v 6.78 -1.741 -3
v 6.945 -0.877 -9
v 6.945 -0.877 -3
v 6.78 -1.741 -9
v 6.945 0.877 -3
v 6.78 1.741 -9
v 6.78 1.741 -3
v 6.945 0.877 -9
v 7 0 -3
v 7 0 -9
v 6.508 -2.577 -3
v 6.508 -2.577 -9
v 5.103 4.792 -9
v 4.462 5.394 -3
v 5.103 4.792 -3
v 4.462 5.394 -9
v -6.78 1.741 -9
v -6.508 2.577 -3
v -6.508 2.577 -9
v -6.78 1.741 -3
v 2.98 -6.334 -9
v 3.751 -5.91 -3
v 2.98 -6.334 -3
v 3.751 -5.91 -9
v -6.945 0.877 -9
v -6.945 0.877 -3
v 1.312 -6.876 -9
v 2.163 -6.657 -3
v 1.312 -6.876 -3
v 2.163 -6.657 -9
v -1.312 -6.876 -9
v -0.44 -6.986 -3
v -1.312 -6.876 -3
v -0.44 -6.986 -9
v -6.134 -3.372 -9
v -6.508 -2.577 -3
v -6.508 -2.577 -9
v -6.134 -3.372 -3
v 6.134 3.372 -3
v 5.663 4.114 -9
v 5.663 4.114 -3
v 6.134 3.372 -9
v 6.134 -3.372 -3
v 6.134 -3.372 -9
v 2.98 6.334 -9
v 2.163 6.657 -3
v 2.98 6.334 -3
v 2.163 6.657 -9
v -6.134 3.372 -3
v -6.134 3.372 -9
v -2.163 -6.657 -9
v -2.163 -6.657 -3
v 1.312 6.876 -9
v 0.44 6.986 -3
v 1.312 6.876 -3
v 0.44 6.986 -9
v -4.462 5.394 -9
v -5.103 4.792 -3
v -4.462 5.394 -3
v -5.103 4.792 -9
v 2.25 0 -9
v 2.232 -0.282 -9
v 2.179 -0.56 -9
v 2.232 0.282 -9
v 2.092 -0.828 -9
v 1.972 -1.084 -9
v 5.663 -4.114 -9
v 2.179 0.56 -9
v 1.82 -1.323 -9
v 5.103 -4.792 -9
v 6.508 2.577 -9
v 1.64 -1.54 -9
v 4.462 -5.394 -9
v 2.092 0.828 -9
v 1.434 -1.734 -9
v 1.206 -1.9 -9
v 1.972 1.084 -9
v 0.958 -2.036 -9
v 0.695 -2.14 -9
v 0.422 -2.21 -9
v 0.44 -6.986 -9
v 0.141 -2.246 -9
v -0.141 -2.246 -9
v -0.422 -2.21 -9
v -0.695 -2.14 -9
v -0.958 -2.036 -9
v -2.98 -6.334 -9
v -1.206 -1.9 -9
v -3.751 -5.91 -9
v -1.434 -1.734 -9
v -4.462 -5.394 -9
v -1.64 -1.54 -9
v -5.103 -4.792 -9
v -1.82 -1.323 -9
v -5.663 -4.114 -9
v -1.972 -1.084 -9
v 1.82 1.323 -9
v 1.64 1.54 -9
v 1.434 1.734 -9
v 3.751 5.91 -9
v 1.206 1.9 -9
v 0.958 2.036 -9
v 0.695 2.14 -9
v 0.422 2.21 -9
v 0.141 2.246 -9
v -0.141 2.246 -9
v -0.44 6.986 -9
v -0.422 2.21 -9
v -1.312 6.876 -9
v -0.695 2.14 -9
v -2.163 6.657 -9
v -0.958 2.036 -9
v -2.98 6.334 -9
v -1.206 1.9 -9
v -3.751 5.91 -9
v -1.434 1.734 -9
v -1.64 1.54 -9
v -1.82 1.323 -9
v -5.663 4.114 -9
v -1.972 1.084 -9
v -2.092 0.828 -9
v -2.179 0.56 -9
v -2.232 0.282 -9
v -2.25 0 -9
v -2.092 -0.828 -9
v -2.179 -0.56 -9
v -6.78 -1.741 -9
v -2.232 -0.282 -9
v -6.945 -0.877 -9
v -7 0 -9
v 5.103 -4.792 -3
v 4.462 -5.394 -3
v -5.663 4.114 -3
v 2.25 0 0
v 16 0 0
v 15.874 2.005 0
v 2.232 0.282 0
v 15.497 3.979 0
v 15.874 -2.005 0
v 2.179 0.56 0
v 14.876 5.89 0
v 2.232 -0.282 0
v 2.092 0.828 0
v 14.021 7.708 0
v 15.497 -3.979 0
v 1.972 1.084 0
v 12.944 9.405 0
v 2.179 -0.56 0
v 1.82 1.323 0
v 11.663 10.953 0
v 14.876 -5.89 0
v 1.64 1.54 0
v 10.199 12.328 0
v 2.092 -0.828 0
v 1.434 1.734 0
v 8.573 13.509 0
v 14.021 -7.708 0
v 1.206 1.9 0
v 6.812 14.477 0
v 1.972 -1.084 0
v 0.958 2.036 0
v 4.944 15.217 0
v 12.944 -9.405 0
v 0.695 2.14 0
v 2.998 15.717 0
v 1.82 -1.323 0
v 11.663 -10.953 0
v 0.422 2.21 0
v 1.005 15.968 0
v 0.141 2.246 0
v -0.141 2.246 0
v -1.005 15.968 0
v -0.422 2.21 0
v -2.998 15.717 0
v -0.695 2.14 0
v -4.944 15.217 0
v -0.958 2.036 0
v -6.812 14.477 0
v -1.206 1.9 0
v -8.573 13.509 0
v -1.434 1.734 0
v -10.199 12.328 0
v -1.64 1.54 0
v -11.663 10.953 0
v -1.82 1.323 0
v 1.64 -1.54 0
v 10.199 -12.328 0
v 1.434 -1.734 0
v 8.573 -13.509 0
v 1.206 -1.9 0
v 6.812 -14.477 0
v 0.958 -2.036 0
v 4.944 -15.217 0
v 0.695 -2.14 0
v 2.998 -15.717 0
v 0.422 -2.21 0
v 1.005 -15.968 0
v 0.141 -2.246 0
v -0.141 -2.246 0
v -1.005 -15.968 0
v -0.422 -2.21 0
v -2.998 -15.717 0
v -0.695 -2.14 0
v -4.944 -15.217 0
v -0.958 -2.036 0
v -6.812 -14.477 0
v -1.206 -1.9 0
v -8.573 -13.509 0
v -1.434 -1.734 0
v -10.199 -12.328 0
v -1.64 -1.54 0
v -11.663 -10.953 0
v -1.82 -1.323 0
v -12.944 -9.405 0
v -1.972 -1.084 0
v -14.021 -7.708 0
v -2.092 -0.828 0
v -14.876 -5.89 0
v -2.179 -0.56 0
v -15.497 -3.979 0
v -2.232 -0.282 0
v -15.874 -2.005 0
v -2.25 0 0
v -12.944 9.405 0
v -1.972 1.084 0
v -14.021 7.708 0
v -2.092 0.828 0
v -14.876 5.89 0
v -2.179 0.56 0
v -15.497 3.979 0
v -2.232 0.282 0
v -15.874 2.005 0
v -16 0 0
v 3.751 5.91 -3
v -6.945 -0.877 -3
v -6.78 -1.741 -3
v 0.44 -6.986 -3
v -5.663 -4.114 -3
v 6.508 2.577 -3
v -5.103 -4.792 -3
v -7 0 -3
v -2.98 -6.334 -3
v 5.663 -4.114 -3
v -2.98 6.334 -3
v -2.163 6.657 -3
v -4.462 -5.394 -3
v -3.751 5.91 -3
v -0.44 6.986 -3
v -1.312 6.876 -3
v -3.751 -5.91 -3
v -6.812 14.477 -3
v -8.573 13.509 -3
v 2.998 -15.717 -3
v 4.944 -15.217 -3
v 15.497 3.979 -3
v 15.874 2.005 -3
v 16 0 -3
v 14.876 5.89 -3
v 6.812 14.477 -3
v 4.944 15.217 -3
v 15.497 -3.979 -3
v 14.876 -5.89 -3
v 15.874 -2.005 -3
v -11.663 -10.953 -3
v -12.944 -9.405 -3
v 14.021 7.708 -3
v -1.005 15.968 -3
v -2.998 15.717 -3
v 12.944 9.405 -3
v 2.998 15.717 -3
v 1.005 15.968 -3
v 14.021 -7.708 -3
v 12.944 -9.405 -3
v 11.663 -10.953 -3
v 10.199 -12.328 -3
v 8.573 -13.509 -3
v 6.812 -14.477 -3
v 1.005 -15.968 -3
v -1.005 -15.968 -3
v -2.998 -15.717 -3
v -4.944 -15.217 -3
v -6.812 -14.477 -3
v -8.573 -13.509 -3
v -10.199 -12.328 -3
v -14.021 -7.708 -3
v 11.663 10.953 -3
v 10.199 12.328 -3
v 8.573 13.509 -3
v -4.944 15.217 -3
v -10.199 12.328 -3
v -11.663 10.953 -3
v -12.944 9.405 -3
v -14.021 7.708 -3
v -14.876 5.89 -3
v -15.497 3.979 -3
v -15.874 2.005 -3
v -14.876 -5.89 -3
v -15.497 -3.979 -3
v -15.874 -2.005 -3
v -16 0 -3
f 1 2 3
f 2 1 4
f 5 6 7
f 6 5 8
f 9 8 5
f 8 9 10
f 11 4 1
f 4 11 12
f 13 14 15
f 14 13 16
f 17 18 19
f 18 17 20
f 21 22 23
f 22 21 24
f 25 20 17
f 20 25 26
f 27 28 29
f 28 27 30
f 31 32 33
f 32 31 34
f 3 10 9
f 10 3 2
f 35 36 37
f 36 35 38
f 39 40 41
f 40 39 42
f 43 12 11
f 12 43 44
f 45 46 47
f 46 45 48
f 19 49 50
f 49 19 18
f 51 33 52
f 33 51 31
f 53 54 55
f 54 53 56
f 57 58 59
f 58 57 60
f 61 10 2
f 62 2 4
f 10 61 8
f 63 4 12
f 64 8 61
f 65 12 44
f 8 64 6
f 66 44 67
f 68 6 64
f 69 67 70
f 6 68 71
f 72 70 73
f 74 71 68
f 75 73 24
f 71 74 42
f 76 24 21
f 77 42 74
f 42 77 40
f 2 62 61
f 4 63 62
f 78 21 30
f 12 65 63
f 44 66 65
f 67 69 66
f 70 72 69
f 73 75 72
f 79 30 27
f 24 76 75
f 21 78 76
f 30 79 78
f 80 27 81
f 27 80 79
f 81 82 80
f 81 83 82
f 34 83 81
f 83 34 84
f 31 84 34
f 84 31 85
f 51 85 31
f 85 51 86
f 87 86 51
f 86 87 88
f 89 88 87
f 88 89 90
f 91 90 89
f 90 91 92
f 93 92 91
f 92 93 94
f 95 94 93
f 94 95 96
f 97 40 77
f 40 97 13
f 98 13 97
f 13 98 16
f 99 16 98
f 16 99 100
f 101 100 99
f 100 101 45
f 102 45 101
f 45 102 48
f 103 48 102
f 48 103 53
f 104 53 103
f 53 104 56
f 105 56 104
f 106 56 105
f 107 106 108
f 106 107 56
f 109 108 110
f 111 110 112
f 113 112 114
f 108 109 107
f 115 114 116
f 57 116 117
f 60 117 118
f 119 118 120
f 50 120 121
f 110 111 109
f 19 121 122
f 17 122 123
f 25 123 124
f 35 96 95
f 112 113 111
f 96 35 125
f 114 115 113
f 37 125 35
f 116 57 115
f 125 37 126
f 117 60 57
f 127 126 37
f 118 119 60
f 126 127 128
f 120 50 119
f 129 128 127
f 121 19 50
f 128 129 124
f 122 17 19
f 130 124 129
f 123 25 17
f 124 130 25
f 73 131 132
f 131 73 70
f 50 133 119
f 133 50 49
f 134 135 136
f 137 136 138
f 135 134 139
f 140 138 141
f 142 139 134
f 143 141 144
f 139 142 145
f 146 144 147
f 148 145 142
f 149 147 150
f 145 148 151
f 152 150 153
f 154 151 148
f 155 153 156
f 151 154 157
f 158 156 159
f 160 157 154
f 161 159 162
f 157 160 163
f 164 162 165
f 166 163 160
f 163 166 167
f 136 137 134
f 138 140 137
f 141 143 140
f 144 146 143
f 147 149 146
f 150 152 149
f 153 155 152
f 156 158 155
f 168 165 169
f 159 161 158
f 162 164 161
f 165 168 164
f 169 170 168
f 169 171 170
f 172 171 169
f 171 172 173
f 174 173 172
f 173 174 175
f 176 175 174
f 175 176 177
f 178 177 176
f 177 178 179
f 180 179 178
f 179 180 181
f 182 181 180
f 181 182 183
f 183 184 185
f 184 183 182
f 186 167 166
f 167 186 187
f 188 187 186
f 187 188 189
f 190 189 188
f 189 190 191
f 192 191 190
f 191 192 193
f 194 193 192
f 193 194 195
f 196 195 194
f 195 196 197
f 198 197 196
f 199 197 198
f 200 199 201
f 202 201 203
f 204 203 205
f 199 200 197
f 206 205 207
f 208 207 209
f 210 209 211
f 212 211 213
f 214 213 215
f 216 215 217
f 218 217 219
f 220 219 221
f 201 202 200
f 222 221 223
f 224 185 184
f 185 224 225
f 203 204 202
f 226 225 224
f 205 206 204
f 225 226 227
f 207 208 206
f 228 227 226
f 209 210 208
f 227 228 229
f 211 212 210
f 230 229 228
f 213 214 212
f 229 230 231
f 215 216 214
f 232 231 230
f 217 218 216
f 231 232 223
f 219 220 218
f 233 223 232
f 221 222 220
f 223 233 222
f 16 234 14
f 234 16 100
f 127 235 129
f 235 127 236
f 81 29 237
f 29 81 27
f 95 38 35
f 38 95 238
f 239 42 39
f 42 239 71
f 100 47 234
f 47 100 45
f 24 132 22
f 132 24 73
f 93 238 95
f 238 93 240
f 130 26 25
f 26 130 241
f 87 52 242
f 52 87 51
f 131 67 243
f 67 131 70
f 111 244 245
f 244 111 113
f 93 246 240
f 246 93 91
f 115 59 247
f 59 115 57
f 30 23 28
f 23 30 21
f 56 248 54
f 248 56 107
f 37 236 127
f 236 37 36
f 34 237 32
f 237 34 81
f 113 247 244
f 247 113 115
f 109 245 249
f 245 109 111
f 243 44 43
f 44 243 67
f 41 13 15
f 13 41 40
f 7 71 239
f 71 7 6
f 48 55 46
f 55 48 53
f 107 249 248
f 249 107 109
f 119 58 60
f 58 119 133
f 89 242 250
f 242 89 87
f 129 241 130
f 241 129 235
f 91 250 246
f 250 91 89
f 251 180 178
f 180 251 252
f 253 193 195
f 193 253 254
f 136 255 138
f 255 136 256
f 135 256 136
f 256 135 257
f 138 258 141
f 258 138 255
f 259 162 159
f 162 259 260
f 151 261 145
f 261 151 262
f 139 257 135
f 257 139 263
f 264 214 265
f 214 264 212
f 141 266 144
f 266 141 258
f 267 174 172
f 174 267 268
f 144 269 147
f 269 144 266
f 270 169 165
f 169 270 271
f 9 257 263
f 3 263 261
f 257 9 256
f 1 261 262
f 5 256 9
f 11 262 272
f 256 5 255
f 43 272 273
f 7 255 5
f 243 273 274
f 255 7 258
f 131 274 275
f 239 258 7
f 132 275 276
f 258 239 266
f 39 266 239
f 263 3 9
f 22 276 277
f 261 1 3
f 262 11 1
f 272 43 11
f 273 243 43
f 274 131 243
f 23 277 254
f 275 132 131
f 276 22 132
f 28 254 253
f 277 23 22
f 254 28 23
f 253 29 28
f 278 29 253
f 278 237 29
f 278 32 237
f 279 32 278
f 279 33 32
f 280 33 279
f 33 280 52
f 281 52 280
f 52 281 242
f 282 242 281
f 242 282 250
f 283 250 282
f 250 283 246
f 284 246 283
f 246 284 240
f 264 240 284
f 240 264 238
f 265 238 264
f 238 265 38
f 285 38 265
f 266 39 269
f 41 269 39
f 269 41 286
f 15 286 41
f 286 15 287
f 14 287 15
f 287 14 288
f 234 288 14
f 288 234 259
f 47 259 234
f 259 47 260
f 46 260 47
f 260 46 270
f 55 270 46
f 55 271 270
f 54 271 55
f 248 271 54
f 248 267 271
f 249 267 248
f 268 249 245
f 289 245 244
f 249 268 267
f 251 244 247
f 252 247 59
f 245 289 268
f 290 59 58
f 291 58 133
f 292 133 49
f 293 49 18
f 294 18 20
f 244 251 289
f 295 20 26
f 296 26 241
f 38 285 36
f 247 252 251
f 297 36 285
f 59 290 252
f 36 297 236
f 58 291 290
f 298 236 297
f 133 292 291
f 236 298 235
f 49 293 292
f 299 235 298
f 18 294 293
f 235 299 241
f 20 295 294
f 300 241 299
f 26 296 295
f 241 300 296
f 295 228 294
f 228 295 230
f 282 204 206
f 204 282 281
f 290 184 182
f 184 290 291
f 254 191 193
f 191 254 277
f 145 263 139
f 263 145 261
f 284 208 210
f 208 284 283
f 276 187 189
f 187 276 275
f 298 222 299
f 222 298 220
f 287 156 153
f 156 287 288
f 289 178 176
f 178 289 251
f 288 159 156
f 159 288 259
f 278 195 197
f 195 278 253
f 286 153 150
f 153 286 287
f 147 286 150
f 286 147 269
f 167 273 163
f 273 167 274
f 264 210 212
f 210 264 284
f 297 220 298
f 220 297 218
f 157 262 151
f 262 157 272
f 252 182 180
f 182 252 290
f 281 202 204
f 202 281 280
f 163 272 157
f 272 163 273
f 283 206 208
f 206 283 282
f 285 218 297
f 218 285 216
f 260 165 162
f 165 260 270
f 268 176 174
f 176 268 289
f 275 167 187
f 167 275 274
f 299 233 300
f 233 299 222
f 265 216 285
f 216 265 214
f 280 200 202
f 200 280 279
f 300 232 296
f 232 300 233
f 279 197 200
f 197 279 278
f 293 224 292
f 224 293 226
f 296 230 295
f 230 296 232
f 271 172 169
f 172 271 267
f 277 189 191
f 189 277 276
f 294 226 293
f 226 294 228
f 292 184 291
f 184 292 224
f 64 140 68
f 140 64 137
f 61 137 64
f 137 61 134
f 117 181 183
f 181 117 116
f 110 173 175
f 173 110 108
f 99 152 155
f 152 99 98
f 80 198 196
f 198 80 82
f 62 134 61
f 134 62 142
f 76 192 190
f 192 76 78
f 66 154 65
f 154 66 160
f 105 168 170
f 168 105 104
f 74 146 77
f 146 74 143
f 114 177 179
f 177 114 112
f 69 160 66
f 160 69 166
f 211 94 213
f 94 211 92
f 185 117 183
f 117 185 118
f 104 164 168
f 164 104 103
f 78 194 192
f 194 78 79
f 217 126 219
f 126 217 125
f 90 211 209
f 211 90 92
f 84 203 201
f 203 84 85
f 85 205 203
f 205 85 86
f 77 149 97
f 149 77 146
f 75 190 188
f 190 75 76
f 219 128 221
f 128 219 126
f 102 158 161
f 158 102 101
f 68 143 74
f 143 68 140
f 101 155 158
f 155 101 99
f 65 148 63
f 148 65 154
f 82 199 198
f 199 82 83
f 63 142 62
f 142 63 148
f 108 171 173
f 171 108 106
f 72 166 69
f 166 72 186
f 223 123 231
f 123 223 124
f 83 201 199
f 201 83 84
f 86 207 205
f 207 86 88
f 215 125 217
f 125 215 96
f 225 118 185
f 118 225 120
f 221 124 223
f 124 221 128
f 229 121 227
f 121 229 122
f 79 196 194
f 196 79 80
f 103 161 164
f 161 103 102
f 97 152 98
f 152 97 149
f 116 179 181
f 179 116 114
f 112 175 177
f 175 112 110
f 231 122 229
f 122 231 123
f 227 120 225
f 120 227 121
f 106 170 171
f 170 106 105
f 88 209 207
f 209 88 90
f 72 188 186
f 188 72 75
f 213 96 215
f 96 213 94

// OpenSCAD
$fn = 50;


difference() {
	union() {
		translate(v = [0, 0, -9.0000000000]) {
			cylinder(h = 9, r = 7.0000000000);
		}
		translate(v = [0, 0, -3.0000000000]) {
			cylinder(h = 3, r = 16.0000000000);
		}
	}
	union() {
		#translate(v = [0, 0, -9]) {
			cylinder(h = 9, r = 2.2500000000);
		}
	}
}
